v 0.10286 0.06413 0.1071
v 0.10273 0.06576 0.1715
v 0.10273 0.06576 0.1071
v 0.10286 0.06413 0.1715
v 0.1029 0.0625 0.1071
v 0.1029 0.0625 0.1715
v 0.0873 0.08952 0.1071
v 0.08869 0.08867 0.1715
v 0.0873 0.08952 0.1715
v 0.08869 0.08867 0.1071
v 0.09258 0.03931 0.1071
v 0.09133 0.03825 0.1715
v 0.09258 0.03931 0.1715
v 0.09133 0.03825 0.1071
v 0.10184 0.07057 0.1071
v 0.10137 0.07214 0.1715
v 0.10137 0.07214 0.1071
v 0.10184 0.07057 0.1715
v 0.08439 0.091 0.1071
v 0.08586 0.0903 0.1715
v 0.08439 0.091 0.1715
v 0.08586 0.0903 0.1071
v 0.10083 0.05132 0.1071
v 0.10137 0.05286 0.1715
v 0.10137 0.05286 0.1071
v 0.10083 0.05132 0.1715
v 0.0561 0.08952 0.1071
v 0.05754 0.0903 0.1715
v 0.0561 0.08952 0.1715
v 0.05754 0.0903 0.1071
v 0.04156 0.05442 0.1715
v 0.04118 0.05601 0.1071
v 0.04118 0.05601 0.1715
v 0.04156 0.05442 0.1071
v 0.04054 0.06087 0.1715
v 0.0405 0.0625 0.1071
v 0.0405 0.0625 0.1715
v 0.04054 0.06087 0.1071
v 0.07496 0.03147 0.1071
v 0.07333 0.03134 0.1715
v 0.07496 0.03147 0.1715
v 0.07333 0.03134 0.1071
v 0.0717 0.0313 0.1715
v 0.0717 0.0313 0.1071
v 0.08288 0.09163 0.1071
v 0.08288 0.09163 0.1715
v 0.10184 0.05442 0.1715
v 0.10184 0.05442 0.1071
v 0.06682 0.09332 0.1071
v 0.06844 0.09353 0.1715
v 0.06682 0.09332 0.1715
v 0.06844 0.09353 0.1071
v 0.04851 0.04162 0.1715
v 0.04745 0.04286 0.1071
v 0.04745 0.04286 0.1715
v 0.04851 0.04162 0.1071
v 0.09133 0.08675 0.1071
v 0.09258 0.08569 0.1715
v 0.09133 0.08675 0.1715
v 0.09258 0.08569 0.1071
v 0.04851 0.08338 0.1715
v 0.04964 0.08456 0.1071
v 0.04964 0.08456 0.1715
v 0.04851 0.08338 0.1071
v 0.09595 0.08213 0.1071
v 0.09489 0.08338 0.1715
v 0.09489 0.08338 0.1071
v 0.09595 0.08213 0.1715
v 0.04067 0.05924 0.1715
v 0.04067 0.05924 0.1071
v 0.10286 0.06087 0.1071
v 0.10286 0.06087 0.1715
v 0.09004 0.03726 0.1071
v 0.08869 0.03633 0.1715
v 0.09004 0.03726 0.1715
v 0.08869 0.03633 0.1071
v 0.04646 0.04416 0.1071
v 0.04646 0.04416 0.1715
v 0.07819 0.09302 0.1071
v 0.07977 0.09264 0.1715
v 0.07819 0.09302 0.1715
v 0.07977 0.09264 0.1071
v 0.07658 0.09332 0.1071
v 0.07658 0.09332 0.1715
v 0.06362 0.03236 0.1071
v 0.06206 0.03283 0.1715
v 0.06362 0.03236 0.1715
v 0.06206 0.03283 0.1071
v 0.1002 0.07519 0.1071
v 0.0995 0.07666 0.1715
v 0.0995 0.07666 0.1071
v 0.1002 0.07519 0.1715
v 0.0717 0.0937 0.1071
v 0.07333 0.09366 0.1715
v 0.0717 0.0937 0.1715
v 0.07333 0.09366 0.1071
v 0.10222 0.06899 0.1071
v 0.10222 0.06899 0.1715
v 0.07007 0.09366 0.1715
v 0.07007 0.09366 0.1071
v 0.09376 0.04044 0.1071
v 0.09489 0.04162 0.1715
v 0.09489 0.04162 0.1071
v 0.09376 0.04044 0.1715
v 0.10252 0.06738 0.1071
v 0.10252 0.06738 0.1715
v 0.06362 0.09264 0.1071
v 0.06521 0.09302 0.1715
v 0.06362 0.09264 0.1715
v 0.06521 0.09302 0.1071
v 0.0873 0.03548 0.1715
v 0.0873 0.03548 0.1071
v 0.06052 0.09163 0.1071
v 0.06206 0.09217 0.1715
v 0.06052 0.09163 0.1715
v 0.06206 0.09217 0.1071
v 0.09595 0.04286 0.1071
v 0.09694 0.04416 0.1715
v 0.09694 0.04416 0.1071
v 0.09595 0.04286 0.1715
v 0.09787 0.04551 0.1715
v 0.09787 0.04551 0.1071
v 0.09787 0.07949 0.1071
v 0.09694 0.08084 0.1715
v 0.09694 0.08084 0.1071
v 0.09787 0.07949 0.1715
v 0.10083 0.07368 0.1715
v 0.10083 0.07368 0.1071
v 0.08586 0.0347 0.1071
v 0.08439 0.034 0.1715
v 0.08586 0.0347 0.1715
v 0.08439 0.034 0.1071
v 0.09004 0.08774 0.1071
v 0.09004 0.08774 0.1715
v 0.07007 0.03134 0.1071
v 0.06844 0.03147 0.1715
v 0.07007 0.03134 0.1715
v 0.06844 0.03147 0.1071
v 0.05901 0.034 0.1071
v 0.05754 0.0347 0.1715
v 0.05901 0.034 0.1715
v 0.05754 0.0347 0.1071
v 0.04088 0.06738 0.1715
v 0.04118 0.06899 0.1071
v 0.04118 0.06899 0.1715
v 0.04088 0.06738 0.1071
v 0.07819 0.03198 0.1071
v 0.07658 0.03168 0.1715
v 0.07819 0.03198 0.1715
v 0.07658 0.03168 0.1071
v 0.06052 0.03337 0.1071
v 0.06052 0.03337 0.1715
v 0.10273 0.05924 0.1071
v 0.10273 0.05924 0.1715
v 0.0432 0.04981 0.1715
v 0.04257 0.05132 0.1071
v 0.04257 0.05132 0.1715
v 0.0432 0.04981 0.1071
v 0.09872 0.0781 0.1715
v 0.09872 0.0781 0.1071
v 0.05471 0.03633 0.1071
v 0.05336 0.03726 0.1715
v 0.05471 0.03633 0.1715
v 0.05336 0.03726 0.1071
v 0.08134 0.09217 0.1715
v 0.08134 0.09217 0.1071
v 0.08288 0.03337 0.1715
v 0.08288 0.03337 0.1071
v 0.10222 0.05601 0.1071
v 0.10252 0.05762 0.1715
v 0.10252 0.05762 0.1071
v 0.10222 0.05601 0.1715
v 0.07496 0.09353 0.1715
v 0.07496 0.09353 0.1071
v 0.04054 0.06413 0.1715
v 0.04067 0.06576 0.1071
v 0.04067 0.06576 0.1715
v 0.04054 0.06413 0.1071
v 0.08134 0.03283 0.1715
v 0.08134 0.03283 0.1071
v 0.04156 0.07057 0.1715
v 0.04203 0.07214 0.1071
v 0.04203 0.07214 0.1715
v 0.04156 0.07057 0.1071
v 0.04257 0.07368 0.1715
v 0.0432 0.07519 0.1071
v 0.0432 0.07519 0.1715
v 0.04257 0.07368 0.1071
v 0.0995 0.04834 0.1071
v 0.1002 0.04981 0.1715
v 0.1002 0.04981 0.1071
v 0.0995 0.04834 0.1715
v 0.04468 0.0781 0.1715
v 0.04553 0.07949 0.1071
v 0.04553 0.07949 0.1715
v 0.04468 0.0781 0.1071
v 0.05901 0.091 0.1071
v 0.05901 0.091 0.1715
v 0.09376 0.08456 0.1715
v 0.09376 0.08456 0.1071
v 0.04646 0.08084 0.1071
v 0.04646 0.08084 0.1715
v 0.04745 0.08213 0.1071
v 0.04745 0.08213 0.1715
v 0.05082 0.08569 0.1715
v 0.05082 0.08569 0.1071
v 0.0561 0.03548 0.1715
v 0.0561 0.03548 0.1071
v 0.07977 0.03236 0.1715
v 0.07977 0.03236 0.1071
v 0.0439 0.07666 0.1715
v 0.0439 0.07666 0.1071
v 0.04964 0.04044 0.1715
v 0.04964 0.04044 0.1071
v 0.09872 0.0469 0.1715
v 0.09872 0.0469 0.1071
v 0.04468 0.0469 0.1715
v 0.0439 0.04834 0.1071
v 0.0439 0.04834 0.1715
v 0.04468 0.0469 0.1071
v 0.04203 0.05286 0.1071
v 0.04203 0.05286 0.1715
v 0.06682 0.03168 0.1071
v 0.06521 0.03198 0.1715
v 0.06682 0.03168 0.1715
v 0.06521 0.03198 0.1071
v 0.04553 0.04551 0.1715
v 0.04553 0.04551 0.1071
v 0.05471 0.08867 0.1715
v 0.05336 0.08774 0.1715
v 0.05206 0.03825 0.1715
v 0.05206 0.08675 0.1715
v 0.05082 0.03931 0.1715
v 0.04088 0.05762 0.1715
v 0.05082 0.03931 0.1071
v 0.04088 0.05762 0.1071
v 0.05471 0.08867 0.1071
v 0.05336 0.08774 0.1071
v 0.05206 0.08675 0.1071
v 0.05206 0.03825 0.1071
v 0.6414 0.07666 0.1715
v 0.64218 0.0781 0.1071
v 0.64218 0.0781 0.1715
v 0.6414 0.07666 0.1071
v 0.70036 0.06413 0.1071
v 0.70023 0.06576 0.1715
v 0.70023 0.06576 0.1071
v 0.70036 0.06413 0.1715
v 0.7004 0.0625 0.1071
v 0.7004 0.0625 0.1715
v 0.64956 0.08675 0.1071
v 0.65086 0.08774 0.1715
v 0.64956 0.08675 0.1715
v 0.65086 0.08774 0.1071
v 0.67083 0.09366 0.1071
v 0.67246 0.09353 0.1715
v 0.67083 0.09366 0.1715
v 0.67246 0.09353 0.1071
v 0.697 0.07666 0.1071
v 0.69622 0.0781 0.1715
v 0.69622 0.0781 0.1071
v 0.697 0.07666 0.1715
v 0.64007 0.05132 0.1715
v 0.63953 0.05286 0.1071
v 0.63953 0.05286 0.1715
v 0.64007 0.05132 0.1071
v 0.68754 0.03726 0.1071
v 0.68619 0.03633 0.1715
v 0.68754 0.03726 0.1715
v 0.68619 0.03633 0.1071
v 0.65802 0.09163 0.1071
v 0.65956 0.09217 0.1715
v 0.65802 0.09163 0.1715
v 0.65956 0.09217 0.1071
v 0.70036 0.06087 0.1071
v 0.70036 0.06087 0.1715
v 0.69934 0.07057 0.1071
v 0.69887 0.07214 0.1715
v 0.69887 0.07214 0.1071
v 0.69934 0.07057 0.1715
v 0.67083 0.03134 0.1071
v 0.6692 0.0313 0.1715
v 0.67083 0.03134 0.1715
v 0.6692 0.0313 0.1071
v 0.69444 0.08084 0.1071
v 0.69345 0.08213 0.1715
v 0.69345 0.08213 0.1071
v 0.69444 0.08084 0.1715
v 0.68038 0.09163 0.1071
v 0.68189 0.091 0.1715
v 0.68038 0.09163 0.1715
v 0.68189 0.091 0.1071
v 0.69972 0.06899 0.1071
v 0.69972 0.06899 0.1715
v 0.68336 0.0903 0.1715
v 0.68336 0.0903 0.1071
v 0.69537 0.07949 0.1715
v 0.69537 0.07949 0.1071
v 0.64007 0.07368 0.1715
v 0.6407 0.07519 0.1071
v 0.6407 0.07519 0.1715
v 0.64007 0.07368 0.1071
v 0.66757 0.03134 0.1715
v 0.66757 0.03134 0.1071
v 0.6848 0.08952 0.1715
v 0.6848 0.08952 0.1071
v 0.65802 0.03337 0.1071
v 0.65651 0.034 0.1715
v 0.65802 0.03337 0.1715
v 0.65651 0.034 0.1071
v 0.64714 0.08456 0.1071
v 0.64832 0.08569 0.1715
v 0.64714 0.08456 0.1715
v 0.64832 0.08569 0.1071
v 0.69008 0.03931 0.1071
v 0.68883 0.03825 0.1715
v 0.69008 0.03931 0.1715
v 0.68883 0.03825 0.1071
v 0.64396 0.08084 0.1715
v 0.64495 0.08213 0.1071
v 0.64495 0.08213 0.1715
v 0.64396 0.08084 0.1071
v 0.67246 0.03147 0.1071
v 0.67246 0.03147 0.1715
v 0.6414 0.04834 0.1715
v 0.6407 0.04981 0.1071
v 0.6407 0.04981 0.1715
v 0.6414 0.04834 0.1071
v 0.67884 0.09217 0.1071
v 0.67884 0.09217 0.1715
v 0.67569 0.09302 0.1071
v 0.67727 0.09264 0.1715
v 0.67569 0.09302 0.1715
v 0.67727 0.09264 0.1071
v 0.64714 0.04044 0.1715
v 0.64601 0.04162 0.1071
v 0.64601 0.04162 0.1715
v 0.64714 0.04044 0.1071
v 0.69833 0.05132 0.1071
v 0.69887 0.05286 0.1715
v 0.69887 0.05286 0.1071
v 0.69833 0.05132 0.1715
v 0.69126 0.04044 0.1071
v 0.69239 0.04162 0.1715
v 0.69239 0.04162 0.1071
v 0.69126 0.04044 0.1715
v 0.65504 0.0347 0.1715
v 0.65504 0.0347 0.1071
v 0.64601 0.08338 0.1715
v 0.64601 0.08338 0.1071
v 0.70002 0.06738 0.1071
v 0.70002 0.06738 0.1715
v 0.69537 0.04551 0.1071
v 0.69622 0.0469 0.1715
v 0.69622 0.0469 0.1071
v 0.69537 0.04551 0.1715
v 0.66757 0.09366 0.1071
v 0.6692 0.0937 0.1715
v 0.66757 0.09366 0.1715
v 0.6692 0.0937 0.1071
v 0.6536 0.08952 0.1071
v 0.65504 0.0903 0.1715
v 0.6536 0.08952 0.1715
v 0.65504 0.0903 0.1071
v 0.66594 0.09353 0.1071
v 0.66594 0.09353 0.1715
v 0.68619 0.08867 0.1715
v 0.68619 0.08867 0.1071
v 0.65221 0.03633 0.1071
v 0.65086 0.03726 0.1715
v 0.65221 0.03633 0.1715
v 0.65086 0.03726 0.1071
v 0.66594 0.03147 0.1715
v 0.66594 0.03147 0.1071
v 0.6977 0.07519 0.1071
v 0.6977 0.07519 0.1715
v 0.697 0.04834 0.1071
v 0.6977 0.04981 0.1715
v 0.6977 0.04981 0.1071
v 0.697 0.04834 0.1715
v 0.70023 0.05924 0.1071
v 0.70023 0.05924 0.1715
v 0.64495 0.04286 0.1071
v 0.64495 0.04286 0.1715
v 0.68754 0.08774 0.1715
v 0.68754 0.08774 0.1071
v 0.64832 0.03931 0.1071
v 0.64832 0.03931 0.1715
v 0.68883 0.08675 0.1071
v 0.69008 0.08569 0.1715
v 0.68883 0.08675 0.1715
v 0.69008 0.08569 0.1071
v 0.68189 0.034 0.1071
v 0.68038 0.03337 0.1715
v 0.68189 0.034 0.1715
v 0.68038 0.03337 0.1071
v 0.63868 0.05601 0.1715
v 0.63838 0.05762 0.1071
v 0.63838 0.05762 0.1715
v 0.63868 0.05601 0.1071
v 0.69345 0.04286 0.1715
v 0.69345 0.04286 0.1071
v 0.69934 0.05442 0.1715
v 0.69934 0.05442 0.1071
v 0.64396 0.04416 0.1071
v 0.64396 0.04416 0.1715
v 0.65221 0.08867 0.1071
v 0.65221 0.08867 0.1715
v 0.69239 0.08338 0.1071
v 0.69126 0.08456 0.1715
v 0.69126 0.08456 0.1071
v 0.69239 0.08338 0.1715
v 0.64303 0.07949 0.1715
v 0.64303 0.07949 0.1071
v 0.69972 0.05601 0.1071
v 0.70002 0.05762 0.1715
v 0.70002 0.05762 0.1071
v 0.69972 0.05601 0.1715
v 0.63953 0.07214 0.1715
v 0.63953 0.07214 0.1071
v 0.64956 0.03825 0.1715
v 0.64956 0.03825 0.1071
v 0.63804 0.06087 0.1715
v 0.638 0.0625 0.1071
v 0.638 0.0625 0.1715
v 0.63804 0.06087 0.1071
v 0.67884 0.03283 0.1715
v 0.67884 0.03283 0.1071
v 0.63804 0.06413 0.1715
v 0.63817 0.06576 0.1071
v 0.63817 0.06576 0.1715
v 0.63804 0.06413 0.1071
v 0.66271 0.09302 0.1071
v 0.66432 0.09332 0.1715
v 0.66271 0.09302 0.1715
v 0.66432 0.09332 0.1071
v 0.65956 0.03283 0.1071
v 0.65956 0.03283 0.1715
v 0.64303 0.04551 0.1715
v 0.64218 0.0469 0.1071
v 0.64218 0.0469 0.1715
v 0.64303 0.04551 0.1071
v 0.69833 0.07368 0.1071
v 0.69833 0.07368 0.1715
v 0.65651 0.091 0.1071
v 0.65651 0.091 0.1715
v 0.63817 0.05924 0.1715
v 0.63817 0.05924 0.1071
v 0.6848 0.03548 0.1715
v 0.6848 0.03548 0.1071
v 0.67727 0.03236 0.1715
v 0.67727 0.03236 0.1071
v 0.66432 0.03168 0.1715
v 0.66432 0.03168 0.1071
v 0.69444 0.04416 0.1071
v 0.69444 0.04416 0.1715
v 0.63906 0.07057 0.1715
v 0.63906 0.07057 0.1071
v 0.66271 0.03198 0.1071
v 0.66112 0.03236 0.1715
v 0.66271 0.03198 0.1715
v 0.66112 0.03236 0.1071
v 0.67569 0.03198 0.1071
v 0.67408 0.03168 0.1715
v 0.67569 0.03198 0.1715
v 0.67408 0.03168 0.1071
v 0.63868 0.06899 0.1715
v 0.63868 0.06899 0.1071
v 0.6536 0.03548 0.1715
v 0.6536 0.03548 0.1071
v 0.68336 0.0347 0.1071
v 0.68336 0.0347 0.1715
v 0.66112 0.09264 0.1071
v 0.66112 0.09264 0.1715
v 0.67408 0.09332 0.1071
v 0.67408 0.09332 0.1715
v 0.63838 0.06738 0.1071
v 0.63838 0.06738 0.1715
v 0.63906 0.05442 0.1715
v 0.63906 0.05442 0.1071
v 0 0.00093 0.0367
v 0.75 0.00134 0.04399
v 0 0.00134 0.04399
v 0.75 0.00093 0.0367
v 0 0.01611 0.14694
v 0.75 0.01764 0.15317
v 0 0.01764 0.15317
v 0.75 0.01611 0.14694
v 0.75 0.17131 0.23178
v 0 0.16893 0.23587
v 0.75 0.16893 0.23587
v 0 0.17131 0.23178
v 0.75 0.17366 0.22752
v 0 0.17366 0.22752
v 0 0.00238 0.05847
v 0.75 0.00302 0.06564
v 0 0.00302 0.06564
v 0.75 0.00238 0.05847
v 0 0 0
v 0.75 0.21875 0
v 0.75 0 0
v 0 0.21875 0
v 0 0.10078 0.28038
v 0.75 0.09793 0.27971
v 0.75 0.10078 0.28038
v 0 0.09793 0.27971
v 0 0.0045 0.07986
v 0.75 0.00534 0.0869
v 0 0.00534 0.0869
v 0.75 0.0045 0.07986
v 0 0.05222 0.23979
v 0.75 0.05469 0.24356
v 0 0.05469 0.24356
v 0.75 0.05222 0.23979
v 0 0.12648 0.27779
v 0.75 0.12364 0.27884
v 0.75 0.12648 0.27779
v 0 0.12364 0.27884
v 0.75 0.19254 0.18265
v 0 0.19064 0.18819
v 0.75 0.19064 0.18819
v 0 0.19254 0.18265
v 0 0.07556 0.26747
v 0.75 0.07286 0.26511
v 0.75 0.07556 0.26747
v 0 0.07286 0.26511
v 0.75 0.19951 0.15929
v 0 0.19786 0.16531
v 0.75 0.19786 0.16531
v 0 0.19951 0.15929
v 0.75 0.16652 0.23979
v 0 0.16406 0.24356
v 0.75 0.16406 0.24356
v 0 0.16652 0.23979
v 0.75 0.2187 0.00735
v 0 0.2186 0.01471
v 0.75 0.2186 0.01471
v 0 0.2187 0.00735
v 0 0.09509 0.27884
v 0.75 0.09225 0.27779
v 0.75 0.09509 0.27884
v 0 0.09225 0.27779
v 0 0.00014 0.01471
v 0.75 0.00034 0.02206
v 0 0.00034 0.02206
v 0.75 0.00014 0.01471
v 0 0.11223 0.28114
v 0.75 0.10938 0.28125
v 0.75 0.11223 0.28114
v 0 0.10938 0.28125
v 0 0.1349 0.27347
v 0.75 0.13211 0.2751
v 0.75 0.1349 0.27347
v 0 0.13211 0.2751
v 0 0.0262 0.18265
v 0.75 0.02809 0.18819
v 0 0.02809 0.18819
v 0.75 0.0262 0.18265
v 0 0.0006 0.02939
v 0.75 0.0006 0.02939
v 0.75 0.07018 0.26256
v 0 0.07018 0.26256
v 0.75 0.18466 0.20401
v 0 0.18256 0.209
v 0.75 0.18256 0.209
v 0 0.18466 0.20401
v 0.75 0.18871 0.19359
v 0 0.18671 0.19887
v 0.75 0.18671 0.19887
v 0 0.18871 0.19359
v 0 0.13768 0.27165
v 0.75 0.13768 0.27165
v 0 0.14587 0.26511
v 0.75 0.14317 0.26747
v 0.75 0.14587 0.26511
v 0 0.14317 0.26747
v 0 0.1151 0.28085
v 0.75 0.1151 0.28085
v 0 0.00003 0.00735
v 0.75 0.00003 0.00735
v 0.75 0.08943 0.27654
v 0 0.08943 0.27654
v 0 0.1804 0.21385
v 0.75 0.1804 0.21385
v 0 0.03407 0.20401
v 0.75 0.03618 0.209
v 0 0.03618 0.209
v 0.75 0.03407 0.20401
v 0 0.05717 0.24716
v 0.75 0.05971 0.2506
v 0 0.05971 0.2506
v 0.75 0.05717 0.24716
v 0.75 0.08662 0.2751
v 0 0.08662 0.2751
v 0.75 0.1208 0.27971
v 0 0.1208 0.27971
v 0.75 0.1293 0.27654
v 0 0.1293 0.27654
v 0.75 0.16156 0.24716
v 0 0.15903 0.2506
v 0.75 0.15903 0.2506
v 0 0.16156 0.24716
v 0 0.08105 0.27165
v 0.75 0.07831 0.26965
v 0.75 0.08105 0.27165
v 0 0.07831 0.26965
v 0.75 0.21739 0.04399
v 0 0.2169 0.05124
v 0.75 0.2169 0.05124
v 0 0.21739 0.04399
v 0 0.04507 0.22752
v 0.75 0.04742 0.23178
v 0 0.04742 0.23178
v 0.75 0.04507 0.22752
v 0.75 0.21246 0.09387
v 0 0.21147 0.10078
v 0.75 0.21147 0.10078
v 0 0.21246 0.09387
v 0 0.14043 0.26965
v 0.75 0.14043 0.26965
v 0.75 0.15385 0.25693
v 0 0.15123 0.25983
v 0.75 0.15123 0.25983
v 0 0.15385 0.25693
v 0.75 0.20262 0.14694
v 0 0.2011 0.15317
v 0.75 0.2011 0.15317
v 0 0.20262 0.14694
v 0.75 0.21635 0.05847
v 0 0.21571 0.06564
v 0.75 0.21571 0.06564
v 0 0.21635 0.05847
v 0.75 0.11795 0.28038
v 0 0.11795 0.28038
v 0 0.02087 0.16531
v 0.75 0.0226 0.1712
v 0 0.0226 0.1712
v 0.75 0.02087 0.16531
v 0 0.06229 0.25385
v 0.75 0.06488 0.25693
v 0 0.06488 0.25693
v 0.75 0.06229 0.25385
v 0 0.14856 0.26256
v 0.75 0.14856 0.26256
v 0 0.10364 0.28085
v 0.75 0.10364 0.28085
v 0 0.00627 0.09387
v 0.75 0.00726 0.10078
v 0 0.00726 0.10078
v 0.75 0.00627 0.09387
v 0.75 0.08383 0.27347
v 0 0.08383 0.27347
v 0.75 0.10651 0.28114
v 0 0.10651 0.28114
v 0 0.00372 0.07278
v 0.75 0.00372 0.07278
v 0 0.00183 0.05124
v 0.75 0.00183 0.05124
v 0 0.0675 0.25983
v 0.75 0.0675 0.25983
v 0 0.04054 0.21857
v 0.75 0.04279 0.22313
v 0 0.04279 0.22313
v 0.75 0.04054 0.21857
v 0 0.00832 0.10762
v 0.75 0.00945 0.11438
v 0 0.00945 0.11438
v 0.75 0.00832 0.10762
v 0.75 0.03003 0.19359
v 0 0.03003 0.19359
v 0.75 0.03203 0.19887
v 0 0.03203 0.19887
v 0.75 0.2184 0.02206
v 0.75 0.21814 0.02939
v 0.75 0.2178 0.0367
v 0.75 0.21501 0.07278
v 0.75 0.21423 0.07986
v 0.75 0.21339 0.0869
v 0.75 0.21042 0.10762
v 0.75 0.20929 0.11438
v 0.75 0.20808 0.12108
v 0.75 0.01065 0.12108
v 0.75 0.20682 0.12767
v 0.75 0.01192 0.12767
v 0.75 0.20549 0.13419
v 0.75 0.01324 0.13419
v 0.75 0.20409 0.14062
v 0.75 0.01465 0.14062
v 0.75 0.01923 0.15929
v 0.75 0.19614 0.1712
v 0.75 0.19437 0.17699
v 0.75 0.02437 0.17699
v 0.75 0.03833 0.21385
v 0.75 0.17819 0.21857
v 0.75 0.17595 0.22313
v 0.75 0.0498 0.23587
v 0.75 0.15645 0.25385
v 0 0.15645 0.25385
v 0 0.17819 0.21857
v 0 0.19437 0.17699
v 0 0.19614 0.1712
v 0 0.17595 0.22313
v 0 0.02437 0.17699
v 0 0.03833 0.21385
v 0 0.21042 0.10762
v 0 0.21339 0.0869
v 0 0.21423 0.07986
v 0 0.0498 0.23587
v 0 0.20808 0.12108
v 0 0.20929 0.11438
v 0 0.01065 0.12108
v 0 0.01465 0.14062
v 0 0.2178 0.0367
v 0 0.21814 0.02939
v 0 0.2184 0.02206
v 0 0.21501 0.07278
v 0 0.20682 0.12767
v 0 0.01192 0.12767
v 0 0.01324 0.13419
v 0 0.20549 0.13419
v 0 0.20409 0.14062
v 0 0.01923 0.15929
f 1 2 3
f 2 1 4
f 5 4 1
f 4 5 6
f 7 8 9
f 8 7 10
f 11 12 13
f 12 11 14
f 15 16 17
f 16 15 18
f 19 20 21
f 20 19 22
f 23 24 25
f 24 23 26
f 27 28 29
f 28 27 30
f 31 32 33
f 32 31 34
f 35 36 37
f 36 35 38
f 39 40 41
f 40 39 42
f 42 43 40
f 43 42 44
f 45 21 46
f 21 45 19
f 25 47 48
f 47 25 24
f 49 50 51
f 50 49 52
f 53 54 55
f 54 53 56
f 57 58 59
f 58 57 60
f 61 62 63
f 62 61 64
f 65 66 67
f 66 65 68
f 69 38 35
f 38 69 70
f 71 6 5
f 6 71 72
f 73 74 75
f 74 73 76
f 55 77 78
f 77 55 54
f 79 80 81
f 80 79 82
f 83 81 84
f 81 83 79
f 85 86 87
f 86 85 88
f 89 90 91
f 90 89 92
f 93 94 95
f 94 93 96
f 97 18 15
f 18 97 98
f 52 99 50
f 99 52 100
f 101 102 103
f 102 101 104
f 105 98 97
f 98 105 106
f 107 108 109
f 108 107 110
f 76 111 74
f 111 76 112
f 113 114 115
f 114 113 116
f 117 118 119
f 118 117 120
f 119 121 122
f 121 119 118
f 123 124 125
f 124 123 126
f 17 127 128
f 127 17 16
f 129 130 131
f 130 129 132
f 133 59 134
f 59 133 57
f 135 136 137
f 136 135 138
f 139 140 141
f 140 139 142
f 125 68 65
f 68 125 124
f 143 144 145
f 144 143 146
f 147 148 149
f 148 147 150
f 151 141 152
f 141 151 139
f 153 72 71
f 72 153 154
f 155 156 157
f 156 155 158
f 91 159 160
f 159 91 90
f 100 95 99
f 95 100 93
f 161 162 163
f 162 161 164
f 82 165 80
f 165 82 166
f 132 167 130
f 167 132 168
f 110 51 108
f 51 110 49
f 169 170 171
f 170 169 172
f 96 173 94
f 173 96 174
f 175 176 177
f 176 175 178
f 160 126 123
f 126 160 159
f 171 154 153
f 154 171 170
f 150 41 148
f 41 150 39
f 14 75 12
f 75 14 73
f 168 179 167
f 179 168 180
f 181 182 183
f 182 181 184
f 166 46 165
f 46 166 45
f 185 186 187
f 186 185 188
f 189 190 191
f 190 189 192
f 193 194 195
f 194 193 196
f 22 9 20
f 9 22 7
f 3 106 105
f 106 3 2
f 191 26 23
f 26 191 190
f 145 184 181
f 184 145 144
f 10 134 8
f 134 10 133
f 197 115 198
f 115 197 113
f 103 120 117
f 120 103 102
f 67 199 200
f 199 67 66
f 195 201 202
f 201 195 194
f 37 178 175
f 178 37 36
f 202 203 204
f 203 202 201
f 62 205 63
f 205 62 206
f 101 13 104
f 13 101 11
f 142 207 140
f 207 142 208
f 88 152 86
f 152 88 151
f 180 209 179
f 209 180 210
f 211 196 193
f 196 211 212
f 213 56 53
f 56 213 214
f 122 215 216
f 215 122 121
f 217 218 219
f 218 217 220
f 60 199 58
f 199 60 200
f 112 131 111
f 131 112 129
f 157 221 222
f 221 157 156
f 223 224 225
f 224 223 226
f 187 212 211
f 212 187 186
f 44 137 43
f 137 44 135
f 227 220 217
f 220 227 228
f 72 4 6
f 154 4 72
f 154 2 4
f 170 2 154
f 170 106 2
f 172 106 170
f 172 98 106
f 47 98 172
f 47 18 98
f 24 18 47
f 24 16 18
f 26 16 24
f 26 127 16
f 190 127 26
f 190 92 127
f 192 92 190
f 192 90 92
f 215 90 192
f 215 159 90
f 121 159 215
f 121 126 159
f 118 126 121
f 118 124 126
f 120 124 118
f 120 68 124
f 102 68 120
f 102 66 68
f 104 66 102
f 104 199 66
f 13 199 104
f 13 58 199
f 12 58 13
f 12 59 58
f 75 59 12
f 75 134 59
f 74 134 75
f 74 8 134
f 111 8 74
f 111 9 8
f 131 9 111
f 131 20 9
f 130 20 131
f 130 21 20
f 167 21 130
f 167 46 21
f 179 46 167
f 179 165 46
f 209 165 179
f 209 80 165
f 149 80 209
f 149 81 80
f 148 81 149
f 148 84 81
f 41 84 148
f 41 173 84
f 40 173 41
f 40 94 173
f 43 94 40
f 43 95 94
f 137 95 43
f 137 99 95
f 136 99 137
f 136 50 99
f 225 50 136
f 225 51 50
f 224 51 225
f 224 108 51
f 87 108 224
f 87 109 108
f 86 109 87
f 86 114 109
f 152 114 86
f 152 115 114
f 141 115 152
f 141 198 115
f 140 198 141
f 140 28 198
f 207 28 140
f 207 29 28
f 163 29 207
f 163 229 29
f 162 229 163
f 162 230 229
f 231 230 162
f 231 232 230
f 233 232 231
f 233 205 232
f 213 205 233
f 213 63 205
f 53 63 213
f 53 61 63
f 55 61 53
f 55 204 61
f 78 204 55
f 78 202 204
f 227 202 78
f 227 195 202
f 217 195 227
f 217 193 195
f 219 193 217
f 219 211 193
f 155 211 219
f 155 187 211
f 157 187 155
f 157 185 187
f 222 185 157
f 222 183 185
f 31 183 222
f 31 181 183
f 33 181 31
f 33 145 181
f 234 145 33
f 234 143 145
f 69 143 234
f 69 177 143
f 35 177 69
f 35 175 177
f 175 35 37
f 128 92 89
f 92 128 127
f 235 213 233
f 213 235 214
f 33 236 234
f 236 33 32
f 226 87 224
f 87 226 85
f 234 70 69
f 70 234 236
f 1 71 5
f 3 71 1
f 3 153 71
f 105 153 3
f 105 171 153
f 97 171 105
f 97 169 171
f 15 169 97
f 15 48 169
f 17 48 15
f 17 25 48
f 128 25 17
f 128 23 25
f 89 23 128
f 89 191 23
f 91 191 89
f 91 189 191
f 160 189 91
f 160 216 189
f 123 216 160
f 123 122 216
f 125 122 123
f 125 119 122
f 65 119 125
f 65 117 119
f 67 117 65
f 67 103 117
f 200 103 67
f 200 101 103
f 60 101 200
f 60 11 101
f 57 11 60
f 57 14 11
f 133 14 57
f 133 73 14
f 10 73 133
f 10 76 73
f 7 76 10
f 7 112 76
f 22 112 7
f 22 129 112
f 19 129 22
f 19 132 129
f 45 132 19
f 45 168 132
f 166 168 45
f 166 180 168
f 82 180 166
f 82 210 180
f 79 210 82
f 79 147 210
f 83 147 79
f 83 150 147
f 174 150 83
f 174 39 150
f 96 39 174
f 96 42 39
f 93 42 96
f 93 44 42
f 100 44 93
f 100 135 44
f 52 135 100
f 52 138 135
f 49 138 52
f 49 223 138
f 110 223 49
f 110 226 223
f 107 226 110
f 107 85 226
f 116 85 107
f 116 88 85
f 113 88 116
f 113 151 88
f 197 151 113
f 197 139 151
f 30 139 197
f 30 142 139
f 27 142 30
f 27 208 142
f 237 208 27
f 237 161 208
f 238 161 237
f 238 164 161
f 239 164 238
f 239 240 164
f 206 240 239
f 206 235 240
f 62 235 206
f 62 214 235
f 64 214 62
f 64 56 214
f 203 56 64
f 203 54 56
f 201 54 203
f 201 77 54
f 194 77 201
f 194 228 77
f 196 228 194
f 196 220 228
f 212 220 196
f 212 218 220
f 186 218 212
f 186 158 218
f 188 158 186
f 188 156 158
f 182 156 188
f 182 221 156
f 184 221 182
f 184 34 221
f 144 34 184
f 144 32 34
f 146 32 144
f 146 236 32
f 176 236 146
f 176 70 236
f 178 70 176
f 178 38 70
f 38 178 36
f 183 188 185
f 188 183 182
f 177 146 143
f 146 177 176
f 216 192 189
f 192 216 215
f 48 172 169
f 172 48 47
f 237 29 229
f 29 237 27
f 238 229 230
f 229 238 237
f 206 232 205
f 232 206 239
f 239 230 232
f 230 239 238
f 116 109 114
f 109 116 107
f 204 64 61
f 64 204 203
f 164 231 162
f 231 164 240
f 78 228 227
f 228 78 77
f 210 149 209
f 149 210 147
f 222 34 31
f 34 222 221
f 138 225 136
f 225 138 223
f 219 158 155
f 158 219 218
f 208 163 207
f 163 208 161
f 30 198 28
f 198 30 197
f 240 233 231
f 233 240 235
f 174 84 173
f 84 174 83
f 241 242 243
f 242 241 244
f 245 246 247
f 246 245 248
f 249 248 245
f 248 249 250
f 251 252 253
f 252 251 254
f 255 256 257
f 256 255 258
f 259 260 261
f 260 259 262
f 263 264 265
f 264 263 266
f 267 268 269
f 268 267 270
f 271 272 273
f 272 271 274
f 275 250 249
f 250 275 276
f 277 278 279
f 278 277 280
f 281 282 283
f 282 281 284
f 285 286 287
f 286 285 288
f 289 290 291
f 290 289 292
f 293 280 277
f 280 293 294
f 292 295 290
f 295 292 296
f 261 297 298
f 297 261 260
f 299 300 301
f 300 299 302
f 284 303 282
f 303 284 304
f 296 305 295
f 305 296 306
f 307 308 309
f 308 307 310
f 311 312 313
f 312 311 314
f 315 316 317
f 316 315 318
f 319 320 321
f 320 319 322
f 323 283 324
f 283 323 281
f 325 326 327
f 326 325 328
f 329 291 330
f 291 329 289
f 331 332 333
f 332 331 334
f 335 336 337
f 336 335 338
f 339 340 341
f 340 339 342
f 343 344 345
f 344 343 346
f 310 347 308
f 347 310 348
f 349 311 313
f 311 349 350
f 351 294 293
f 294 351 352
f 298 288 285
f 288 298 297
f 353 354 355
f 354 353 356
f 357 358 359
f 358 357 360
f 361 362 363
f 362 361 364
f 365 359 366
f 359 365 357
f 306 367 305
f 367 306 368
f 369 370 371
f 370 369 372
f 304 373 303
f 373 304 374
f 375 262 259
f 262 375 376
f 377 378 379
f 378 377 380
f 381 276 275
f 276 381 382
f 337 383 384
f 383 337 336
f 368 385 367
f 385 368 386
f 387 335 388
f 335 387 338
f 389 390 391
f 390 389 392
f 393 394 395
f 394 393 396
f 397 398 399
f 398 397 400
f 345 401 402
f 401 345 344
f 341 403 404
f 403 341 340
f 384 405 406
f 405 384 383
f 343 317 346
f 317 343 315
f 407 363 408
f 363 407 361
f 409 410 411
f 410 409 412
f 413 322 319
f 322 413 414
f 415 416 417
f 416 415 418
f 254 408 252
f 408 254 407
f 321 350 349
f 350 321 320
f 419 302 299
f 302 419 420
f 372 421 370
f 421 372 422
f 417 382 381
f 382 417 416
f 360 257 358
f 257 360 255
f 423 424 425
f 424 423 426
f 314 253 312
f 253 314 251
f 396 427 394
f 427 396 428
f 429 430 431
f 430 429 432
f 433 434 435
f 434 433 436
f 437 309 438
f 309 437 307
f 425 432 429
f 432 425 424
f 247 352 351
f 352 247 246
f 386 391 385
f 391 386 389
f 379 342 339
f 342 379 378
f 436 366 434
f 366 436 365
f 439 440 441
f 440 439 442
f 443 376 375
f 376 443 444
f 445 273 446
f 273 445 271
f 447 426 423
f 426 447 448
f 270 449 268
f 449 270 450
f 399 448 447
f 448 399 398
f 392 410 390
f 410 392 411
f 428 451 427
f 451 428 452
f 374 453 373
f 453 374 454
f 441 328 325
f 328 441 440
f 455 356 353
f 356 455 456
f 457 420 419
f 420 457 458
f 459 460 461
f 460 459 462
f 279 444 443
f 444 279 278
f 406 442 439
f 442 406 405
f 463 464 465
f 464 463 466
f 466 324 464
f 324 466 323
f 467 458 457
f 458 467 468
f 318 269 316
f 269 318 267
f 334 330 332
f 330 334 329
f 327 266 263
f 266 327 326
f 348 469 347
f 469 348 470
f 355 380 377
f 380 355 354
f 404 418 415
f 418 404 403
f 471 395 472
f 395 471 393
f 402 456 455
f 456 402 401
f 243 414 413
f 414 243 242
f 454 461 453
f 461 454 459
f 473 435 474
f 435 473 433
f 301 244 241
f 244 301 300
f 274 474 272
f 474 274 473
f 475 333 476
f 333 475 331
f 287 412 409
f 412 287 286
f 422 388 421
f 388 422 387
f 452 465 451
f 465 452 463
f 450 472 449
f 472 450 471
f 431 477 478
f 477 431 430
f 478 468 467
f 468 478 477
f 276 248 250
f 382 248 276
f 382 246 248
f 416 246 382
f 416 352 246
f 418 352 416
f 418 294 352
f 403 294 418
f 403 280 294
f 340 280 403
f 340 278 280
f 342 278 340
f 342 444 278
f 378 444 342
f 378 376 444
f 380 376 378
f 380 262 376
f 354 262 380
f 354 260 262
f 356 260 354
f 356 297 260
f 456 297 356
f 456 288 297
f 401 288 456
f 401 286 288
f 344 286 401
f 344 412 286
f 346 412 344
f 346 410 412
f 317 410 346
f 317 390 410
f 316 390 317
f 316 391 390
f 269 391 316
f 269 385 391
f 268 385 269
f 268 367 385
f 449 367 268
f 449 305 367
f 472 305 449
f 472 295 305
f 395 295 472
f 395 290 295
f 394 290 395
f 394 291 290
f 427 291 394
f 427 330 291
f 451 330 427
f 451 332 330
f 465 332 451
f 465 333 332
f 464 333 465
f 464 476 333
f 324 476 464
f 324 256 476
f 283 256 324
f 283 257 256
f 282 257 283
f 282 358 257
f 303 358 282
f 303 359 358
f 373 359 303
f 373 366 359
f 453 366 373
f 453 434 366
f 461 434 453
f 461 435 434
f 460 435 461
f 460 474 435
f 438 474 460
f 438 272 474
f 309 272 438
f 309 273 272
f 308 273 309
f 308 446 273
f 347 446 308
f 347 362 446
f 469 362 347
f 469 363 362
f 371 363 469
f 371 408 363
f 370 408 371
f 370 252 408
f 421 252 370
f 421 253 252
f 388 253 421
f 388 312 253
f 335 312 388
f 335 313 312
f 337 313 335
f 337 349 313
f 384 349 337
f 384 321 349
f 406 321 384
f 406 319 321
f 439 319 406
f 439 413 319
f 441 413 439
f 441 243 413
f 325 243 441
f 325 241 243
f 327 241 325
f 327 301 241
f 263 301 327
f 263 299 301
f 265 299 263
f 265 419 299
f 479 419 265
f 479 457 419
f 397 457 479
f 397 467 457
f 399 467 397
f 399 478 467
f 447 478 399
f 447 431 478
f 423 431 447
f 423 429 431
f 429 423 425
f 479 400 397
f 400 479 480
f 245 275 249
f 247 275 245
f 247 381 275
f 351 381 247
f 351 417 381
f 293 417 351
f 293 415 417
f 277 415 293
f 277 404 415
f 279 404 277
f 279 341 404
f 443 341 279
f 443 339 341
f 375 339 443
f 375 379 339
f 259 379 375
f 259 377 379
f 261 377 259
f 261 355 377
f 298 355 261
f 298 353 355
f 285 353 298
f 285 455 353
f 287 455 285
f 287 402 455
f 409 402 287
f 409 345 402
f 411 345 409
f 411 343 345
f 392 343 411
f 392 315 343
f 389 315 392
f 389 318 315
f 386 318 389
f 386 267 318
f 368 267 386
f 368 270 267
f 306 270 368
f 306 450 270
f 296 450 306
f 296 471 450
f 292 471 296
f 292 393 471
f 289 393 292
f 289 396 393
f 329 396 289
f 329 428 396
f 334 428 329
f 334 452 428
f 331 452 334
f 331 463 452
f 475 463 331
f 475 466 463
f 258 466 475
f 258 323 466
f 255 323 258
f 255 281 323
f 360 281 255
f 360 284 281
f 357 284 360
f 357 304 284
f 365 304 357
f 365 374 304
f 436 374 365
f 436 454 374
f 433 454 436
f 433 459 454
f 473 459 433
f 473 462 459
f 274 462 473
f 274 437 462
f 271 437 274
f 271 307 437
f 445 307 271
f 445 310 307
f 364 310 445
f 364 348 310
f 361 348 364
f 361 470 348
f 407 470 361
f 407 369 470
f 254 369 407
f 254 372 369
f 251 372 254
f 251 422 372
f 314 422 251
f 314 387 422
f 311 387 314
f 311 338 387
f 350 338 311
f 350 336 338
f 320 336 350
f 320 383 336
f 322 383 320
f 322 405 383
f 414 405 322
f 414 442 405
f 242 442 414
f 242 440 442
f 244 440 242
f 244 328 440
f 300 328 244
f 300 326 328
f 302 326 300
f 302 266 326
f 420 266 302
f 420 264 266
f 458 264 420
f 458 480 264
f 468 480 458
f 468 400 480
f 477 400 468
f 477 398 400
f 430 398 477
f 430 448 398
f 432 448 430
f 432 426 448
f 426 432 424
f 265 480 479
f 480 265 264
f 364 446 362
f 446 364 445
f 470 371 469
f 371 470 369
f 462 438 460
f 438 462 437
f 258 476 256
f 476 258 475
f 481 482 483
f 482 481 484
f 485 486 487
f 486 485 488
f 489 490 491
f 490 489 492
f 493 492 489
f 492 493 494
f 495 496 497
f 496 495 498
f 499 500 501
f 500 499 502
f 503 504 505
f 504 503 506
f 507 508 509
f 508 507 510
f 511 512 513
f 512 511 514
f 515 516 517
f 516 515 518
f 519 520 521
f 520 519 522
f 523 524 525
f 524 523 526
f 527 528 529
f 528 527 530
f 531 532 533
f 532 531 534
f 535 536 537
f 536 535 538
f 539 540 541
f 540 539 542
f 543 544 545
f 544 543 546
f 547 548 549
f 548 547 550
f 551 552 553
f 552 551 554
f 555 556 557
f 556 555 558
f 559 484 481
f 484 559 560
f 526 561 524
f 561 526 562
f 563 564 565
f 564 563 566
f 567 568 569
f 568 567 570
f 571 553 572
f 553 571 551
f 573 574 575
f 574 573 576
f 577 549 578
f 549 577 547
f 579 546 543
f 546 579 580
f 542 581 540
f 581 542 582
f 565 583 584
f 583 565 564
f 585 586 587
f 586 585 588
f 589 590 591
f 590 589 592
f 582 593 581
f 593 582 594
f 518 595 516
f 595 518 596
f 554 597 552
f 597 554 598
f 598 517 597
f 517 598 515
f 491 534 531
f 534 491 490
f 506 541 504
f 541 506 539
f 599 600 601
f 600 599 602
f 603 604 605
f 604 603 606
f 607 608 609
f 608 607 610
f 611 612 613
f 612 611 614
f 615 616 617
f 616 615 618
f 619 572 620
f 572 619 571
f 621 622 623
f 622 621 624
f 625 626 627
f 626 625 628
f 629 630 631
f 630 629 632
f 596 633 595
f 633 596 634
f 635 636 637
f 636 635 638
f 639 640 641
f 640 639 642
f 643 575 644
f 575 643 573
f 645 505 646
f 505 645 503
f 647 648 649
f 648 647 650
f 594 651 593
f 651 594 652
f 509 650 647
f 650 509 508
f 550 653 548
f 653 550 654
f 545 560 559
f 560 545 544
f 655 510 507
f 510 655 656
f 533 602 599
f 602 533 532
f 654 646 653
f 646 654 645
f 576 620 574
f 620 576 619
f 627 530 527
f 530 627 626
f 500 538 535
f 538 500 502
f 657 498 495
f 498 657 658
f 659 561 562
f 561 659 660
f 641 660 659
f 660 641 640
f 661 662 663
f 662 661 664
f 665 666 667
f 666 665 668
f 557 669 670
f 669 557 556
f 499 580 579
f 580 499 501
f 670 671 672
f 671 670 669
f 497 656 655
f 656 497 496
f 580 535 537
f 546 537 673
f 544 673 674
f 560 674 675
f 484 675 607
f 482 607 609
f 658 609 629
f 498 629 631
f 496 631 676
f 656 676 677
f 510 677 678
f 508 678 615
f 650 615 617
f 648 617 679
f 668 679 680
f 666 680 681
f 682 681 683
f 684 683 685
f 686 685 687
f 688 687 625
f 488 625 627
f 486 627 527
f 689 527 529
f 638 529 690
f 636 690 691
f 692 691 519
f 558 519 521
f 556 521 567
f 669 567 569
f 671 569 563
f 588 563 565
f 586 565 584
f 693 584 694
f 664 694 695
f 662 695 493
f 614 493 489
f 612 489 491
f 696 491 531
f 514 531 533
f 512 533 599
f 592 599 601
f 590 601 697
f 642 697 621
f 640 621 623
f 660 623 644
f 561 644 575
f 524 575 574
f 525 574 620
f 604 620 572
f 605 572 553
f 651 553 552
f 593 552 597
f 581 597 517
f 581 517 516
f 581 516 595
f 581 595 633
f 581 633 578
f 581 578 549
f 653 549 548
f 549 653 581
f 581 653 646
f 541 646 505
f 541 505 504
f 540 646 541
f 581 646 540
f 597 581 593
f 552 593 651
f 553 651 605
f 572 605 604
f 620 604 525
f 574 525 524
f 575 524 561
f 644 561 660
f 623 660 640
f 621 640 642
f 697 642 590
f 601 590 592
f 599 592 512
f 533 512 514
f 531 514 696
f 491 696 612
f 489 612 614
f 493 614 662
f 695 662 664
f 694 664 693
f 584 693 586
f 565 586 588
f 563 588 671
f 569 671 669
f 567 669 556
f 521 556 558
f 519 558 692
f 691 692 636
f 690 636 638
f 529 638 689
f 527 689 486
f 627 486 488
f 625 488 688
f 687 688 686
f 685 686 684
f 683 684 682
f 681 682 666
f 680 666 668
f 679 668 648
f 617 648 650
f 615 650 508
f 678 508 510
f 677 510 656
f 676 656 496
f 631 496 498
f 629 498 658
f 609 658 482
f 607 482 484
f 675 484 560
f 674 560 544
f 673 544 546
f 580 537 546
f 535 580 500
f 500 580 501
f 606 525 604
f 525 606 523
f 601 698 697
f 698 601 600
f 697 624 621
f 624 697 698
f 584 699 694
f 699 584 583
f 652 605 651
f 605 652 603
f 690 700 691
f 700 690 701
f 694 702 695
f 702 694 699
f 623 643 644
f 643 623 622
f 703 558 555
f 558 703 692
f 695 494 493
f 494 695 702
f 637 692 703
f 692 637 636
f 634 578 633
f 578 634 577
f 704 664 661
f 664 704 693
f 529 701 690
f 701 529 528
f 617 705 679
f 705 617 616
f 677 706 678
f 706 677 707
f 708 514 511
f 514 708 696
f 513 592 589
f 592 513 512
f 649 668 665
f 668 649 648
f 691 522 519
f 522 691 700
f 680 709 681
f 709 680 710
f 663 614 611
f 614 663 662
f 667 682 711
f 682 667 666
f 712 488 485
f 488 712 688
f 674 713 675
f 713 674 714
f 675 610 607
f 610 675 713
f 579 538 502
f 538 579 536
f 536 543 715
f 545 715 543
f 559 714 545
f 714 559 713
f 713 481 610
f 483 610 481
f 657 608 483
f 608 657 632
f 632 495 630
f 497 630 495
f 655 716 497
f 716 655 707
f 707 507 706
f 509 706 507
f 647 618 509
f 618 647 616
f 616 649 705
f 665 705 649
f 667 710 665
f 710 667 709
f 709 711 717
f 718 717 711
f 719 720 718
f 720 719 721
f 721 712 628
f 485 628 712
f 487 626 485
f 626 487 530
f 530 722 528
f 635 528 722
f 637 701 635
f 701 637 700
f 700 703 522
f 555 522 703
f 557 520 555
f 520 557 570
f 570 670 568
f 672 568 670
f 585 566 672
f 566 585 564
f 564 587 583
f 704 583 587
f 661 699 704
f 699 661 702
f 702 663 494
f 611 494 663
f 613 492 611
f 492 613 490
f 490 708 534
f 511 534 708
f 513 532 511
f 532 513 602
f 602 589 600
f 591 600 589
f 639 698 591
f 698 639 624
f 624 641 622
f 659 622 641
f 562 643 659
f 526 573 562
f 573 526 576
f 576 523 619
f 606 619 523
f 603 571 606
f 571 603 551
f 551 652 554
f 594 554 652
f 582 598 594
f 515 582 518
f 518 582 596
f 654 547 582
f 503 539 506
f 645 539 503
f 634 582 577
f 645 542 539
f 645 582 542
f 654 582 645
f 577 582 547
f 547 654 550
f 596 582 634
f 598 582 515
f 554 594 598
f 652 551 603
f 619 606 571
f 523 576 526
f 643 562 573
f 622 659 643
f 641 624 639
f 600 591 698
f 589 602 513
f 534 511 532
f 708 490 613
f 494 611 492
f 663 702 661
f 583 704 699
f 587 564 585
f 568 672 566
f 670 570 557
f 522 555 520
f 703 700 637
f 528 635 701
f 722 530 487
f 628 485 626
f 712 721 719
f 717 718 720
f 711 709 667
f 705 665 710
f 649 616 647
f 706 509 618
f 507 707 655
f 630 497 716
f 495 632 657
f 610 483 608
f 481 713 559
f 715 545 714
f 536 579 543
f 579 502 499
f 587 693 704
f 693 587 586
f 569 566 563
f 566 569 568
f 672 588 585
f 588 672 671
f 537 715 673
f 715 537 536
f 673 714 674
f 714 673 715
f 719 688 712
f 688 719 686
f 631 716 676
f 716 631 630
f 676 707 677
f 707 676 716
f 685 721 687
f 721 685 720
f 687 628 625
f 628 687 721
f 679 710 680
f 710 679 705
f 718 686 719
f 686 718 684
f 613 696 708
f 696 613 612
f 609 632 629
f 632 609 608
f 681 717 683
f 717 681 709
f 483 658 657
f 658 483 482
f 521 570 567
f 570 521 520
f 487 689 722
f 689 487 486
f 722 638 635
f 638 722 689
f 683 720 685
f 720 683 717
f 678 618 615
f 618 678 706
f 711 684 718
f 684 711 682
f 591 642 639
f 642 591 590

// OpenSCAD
// === Parameters ===
// Main base dimensions
base_length  = 0.75;      // extent along X (left-right)
base_width   = 0.21875;   // extent along Y (front-back)
base_height  = 0.28125;   // peak height along Z
ext_depth    = 0.2812;    // extrusion depth (~base_height)

// Circular hole parameters
hole1_x      = 0.0717;    // first hole center from left edge
hole1_y      = 0.0625;    // first hole center from front edge
hole2_x      = 0.6692;    // second hole center from left edge
hole2_y      = 0.0625;    // second hole center from front edge
hole_r       = 0.0312;    // radius of each circular profile

// Cut band Z-range (above base underside)
cut_z_bot    = 0.1081;    // bottom of removed band
cut_z_top    = 0.1705;    // top of removed band
cut_depth    = 0.0625;    // vertical thickness of cut

// Resolution
$fn = 120;

// === Modules ===

// Semi-elliptical arch profile (2D, in local XY)
// X spans [0, w], Y spans [0, h]; flat base along X axis
module arch_profile_2d(w, h) {
    a = w / 2;   // half-width (horizontal semi-axis)
    b = h;       // full height (vertical semi-axis)
    n = $fn;
    points = [
        for (i = [0 : n])
            let(theta = 180 * i / n)
            [a + a * cos(theta), b * sin(theta)]
    ];
    polygon(points);
}

// Arched base: semi-elliptical cross-section extruded along length
// rotate(120,[1,1,1]) cyclically remaps local X->global Y,
// local Y->global Z, local Z (extrusion)->global X
module arched_base() {
    rotate(120, [1, 1, 1])
        linear_extrude(height = base_length)
            arch_profile_2d(base_width, base_height);
}

// Two separate circular cuts — no slot or pocket connecting them
module circular_cuts() {
    h_cut = cut_z_top - cut_z_bot;
    eps   = 0.001;  // small clearance for clean boolean

    // Circle 1: near the left end
    translate([hole1_x, hole1_y, cut_z_bot - eps])
        cylinder(h = h_cut + 2 * eps, r = hole_r);

    // Circle 2: near the right end
    translate([hole2_x, hole2_y, cut_z_bot - eps])
        cylinder(h = h_cut + 2 * eps, r = hole_r);
}

// === Final Assembly ===
// Subtract the two circular holes from the arched base
difference() {
    arched_base();
    circular_cuts();
}
